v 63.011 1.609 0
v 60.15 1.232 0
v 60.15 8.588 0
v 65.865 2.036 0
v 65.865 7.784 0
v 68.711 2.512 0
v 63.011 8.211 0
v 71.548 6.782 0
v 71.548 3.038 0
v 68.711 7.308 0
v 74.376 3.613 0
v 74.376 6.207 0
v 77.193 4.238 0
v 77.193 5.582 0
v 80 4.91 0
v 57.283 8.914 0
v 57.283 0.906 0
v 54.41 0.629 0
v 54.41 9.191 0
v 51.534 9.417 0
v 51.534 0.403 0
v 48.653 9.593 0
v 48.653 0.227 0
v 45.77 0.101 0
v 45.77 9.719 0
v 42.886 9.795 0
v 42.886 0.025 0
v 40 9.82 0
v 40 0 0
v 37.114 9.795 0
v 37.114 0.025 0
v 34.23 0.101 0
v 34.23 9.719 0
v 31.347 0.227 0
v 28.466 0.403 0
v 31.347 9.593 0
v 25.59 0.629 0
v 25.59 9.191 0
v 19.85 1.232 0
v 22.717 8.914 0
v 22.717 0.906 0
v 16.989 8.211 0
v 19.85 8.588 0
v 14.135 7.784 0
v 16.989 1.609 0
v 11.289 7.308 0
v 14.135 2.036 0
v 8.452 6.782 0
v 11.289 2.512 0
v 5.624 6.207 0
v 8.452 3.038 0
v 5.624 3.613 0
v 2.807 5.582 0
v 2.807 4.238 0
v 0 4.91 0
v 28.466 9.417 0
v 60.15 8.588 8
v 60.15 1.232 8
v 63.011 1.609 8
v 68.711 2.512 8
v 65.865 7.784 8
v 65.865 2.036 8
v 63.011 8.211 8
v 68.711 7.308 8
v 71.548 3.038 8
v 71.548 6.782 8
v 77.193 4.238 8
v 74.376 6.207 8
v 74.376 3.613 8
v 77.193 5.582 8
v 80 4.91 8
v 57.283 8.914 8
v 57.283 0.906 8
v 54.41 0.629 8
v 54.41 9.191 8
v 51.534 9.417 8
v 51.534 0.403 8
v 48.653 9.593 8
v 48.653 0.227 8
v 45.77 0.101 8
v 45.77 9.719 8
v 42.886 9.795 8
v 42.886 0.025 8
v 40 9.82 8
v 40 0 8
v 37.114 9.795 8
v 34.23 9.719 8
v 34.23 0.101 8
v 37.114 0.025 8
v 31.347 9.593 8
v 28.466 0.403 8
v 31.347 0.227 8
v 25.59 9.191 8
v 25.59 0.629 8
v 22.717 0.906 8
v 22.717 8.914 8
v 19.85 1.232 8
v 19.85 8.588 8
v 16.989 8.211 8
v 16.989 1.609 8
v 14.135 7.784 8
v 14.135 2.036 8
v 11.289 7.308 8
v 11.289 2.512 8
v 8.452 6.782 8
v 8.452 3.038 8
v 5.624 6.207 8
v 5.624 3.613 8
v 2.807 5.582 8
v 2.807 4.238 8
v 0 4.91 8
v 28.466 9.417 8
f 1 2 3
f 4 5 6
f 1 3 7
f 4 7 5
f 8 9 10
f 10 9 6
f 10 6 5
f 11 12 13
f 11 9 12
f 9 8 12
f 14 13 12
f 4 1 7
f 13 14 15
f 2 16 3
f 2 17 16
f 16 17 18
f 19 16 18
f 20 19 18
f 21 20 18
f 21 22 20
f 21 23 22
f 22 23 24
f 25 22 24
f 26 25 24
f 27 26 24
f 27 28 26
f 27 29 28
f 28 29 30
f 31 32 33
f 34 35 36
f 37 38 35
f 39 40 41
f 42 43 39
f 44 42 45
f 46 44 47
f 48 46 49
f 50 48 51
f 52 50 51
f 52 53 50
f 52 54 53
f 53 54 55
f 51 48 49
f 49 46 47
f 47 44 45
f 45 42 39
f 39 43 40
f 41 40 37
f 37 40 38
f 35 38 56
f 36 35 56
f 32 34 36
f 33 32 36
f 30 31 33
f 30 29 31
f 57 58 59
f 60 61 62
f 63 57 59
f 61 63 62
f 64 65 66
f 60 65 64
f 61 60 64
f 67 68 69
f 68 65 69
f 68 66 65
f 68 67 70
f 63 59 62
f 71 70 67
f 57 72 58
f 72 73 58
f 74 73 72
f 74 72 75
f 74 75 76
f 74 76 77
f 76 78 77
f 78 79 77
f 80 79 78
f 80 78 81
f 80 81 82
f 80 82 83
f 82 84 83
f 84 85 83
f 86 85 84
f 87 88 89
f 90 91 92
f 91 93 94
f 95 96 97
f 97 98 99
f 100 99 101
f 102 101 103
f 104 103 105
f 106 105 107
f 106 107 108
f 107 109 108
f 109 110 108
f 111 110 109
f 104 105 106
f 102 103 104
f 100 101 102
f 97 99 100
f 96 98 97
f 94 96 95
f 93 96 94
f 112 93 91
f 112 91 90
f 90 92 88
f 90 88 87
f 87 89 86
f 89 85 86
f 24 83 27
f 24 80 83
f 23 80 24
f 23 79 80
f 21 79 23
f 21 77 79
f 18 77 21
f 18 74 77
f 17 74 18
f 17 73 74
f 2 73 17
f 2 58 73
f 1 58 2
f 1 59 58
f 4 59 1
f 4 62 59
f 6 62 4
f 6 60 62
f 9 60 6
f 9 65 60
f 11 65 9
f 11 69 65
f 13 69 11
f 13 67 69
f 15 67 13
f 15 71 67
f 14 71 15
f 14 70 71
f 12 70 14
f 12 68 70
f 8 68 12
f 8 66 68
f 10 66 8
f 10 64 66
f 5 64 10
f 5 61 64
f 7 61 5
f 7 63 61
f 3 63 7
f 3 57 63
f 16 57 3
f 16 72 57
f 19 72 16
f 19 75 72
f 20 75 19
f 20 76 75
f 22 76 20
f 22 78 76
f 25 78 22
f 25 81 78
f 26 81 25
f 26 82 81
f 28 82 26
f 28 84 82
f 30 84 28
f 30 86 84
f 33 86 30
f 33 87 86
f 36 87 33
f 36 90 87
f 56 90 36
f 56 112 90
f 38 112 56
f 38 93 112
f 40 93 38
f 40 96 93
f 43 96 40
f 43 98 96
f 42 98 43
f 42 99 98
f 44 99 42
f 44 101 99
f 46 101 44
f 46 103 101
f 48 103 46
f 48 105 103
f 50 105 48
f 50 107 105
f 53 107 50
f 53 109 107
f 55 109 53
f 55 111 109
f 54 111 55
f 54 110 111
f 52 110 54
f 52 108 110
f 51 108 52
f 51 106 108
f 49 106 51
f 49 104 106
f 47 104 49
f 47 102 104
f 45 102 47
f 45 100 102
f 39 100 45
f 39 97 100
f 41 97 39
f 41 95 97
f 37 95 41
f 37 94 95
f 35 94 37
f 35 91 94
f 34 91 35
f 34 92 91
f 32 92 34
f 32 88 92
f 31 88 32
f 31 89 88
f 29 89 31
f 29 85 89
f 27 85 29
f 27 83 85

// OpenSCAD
$fn = 32;

// ----------------------------------------------------------------------
// Arc profile plate: lens, 56 points
// ----------------------------------------------------------------------

// --- parameters (mm) ---
lens_chord = 80;          // chord length of the lens, X
arc_r = 165.34;           // radius of both arcs
arc_angle = 28;           // angle of each arc, degrees
sagitta = 4.91;           // bulge of each arc (half the lens height)
arc_step = 1;             // sampling step of the arcs, degrees
plate_t = 8;              // plate thickness, Z

bbox_y = 2 * sagitta;  // full lens height

profile = [[80, 4.91], [77.193, 5.582], [74.376, 6.207], [71.548, 6.782], [68.711, 7.308], [65.865, 7.784], [63.011, 8.211], [60.15, 8.588], [57.283, 8.914], [54.41, 9.191], [51.534, 9.417], [48.653, 9.593], [45.77, 9.719], [42.886, 9.795], [40, 9.82], [37.114, 9.795], [34.23, 9.719], [31.347, 9.593], [28.466, 9.417], [25.59, 9.191], [22.717, 8.914], [19.85, 8.588], [16.989, 8.211], [14.135, 7.784], [11.289, 7.308], [8.452, 6.782], [5.624, 6.207], [2.807, 5.582], [0, 4.91], [2.807, 4.238], [5.624, 3.613], [8.452, 3.038], [11.289, 2.512], [14.135, 2.036], [16.989, 1.609], [19.85, 1.232], [22.717, 0.906], [25.59, 0.629], [28.466, 0.403], [31.347, 0.227], [34.23, 0.101], [37.114, 0.025], [40, 0], [42.886, 0.025], [45.77, 0.101], [48.653, 0.227], [51.534, 0.403], [54.41, 0.629], [57.283, 0.906], [60.15, 1.232], [63.011, 1.609], [65.865, 2.036], [68.711, 2.512], [71.548, 3.038], [74.376, 3.613], [77.193, 4.238]];  // primary outline, 56 points, counter clockwise

// --- the one profile operation ---
linear_extrude(height = plate_t) polygon(points = profile);
